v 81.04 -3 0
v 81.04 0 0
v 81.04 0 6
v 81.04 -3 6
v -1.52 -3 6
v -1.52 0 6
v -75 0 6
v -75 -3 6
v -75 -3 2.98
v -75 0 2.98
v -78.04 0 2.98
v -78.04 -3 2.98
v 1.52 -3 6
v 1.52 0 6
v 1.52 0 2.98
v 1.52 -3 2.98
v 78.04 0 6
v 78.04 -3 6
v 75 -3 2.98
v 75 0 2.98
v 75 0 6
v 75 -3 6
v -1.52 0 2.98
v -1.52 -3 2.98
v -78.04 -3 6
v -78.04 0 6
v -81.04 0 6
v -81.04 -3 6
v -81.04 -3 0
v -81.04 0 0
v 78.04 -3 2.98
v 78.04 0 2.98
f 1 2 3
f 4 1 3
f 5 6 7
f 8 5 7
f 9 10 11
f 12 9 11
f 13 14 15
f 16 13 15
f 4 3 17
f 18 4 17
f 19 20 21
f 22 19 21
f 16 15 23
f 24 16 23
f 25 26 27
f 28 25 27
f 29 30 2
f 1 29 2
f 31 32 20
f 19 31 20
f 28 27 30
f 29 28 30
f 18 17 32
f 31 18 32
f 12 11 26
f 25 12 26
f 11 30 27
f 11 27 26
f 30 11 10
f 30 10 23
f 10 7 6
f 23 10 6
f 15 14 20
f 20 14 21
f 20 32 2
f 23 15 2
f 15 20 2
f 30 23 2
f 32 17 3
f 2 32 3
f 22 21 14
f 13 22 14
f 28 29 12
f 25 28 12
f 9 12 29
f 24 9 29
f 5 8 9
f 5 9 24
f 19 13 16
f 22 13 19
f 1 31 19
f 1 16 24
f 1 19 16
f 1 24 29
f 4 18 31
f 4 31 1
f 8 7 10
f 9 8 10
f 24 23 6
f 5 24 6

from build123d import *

# Parameters (mm, degrees)
F1_DEPTH = 3


# Not quite as in the source:
# - a feature names something its author has since deleted; it is built from what else it names


with BuildPart() as f1:
    # F0 (on Front) → F1 (new body)
    with BuildSketch(Plane.XZ):
        Polygon((-81.04, 6), (-81.04, 0), (81.04, 0), (81.04, 6), (78.04, 6), (78.04, 2.98), (75, 2.98), (75, 6), (1.52, 6), (1.52, 2.98), (-1.52, 2.98), (-1.52, 6), (-75, 6), (-75, 2.98), (-78.04, 2.98), (-78.04, 6), align=None)
    extrude(amount=F1_DEPTH)


solid = f1.part
